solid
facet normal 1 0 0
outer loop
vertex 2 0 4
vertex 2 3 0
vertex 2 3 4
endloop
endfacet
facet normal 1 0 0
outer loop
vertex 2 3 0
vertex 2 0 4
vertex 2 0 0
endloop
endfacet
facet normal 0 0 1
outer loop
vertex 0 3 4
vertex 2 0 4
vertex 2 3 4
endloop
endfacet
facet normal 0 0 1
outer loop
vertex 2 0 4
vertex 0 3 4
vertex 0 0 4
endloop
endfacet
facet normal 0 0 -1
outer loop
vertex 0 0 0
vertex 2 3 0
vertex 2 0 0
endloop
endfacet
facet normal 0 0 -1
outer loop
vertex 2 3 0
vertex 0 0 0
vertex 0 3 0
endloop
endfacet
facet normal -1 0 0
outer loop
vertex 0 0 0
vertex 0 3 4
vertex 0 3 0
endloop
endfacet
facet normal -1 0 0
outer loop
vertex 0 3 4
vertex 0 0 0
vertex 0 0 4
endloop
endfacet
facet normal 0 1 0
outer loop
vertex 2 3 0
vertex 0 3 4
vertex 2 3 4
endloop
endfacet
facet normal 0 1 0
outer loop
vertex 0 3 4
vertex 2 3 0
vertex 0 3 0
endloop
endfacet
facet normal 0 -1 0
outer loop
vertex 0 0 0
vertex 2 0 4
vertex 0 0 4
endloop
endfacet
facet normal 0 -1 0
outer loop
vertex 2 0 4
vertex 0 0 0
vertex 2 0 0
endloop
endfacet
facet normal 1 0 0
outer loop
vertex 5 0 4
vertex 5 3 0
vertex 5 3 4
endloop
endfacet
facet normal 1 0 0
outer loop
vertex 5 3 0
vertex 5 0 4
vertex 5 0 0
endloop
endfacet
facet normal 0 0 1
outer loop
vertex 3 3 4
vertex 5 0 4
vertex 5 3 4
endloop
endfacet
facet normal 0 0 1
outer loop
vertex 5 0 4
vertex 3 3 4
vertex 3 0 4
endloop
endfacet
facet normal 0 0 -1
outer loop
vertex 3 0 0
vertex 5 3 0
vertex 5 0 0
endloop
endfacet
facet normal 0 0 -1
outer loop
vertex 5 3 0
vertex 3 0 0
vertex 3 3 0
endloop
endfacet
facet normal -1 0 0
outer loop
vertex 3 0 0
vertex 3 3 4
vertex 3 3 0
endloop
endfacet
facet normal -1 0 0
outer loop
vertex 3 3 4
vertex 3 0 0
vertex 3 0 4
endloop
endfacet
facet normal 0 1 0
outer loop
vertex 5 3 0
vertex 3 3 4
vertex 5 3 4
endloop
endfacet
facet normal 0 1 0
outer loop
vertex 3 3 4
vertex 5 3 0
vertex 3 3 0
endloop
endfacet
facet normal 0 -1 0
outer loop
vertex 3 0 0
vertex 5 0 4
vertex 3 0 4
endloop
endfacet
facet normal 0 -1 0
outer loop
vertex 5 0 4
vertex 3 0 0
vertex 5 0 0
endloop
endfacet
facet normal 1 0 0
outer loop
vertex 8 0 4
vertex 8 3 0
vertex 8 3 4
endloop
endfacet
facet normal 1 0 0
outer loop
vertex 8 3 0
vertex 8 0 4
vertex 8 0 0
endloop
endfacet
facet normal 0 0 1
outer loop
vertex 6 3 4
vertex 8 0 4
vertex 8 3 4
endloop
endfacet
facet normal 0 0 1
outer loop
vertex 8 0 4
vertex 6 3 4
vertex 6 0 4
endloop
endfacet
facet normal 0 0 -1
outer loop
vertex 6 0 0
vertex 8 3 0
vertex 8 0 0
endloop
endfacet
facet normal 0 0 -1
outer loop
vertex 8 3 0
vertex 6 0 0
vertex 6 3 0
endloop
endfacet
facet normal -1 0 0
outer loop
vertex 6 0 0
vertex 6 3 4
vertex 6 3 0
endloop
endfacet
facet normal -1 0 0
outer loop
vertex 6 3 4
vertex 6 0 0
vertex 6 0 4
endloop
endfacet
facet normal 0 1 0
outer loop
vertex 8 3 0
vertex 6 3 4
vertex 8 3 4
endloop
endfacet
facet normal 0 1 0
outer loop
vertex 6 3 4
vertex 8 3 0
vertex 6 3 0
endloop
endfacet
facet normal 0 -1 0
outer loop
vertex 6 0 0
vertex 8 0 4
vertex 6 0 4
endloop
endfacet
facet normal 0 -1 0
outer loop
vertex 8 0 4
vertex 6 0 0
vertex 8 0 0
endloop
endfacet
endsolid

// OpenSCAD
color([1,0,0]) cube([2,3,4]);
translate([3,0,0])
color([0,1,0]) cube([2,3,4]);
translate([6,0,0])
color([0,0,1]) cube([2,3,4]);
